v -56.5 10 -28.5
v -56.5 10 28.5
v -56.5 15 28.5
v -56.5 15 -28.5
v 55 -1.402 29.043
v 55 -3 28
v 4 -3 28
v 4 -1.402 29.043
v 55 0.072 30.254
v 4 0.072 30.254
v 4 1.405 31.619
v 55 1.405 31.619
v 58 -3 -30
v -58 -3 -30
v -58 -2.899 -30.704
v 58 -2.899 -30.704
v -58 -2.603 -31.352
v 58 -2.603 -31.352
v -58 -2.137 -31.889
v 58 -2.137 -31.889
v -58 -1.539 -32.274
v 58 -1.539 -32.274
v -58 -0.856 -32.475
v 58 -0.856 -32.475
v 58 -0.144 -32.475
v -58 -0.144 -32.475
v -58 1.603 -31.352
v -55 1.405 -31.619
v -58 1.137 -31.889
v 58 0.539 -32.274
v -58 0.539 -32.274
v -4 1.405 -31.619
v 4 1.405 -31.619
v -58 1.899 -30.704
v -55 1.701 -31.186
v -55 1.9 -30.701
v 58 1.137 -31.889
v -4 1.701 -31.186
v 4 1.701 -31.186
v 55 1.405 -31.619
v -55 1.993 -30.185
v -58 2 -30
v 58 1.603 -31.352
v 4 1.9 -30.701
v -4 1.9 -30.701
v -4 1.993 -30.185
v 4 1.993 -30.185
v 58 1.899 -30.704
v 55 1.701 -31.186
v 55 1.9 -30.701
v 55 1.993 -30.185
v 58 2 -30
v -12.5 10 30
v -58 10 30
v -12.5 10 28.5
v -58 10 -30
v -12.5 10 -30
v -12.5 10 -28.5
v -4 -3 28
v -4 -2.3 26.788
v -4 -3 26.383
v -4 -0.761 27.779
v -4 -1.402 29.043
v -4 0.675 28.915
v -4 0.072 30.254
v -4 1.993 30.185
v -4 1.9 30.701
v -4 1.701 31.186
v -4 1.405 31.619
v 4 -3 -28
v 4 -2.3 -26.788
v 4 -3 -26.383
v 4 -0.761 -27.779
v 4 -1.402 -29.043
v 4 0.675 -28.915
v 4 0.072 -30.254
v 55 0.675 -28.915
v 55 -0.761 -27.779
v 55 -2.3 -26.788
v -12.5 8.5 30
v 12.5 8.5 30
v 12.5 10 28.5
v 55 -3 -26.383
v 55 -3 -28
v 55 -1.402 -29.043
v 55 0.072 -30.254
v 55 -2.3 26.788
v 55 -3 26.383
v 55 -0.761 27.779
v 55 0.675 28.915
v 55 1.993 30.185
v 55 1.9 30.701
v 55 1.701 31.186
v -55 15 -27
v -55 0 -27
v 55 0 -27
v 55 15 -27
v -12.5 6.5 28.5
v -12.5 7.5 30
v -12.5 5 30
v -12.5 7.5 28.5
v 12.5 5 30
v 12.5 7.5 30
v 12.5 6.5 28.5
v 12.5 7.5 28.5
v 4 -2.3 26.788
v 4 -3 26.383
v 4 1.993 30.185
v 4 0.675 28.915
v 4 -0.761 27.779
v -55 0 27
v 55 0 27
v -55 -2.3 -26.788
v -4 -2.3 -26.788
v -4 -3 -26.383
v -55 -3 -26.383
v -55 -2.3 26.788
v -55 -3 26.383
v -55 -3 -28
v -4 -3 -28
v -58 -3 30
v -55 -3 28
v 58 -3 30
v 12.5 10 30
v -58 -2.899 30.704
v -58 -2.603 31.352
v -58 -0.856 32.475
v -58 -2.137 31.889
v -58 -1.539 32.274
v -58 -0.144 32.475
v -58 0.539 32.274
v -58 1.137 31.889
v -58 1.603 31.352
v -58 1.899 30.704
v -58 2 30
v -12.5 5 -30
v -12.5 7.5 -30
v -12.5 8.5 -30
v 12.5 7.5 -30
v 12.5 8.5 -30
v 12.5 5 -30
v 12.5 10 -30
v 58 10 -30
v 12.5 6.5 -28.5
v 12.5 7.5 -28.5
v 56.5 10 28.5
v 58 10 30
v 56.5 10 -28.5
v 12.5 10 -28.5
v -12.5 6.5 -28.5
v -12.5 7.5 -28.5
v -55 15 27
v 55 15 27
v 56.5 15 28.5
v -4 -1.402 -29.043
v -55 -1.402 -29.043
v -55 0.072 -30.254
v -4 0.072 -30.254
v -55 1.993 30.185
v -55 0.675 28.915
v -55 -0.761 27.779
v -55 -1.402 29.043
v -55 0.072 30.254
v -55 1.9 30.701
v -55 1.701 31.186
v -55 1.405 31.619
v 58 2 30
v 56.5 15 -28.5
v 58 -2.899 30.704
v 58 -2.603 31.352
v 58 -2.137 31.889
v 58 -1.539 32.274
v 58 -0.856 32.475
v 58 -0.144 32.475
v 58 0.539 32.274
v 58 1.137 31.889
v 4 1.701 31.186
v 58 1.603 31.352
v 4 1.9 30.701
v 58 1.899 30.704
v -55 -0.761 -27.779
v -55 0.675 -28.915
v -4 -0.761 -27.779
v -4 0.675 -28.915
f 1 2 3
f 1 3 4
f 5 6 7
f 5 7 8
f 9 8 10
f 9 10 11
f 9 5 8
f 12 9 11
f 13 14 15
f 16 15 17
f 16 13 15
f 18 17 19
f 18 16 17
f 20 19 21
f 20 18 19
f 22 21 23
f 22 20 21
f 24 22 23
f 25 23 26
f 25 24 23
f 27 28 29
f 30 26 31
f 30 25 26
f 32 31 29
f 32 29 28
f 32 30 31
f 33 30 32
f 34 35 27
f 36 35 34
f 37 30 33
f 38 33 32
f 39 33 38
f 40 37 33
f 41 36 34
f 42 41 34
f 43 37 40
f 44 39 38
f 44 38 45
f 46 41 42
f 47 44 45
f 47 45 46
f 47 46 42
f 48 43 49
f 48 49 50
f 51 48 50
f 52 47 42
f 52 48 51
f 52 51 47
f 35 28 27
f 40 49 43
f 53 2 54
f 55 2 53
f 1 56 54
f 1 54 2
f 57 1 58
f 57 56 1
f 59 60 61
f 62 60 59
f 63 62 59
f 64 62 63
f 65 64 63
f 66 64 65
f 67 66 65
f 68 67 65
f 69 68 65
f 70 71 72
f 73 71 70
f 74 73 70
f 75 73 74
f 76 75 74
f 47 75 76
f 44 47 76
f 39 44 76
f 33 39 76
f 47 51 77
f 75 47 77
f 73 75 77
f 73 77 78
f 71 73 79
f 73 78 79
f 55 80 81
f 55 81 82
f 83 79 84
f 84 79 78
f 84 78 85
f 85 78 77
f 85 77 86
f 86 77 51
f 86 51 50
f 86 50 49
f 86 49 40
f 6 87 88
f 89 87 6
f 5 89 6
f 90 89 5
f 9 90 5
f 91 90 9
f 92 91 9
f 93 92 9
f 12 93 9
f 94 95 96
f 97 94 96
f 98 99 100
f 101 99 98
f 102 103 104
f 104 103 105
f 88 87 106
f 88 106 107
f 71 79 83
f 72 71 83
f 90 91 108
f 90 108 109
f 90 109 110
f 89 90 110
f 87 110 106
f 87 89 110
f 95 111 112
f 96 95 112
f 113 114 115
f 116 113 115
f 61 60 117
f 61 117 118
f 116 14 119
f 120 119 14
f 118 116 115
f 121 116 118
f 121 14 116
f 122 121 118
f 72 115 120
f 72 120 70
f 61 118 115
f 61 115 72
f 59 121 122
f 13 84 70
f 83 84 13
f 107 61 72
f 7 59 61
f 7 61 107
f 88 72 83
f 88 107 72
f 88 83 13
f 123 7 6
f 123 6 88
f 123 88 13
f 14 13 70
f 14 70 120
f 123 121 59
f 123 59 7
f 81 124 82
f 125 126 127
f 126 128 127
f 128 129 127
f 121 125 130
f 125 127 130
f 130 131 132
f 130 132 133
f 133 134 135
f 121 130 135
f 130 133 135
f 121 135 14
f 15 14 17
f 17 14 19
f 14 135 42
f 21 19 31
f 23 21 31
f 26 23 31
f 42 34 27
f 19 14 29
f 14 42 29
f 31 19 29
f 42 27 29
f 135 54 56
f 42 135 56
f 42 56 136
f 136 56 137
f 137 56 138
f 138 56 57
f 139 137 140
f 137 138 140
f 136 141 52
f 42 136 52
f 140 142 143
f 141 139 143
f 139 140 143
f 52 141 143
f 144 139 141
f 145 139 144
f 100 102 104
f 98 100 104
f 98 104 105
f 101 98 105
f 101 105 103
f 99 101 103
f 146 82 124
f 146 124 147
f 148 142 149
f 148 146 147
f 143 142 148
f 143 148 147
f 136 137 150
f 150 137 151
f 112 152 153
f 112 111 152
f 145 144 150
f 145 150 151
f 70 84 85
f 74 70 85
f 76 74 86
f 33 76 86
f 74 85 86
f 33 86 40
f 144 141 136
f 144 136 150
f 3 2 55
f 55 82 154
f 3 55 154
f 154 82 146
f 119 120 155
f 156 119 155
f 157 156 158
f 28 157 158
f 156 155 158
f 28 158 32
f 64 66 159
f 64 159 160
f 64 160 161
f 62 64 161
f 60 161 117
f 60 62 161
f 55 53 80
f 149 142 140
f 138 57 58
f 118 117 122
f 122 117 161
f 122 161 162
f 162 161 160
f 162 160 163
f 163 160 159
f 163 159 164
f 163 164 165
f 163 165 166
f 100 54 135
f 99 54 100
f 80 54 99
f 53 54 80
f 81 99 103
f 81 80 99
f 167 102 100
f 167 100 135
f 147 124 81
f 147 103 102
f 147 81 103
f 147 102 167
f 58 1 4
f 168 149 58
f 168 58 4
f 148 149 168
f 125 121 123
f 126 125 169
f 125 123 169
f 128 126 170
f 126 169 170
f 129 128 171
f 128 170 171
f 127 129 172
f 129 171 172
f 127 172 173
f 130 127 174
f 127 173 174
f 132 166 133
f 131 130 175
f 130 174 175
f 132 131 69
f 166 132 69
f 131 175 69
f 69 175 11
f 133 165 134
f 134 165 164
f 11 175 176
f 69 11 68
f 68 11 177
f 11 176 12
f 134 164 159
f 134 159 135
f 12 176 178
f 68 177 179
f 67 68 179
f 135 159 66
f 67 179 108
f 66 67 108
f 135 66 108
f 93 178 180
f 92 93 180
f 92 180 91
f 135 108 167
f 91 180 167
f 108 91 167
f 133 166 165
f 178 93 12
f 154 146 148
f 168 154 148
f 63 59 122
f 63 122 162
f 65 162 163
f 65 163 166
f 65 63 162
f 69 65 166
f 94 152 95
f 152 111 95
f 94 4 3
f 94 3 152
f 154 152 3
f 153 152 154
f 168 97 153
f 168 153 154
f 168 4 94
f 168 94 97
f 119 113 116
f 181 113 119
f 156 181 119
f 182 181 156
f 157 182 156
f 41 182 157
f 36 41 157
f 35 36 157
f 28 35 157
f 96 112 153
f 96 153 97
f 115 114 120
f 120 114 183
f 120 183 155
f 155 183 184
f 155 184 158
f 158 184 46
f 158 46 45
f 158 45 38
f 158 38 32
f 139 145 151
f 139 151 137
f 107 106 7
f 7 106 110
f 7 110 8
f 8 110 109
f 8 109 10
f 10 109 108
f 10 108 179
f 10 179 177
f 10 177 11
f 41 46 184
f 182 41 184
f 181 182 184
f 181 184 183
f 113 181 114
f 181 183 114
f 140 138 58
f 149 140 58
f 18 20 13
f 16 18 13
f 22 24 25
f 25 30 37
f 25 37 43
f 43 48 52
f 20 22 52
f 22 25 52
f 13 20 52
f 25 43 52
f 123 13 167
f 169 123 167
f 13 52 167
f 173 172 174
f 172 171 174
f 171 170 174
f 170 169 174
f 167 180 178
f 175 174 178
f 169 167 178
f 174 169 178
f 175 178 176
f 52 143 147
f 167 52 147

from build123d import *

# Parameters (mm, degrees)
SKETCH1_W                       = 116
SKETCH1_H                       = 60
SKETCH1_W_2                     = 110
SKETCH1_H_2                     = 54
BOSS_EXTRUDE1_DEPTH             = 10
SKETCH2_W                       = 116
SKETCH2_H                       = 60
BOSS_EXTRUDE2_DEPTH             = 3
CUT_EXTRUDE1_DEPTH              = 12.5
BOSS_EXTRUDE4_REACH             = 68.061
BOSS_EXTRUDE4_DIRECTION_2_REACH = 68.061
BOSS_EXTRUDE5_DEPTH             = 55
CUT_EXTRUDE2_DEPTH              = 4
SKETCH7_W                       = 113
SKETCH7_H                       = 57
SKETCH7_W_2                     = 110
SKETCH7_H_2                     = 54
BOSS_EXTRUDE6_DEPTH             = 5


with BuildPart() as part:
    # Sketch1 → Boss-Extrude1 (new body)
    with BuildSketch(Plane(origin=(0, 0, 0), x_dir=(1, 0, 0), z_dir=(0, 1, 0))):
        Rectangle(SKETCH1_W, SKETCH1_H)
        Rectangle(SKETCH1_W_2, SKETCH1_H_2, mode=Mode.SUBTRACT)
    extrude(amount=BOSS_EXTRUDE1_DEPTH)

    # Sketch2 → Boss-Extrude2 (add)
    with BuildSketch(Plane.XZ):
        Rectangle(SKETCH2_W, SKETCH2_H)
    extrude(amount=BOSS_EXTRUDE2_DEPTH)

    # Sketch3 → Cut-Extrude1 (cut, symmetric)
    with BuildSketch(Plane(origin=(0, 0, 0), x_dir=(0, 0, -1), z_dir=(1, 0, 0))):
        Polygon((-28.5, 10), (-31, 10), (-31, 4), (-28.5, 6.5), (-28.5, 7.5), (-30, 7.5), (-30, 8.5), align=None)
    cut_extrude1 = extrude(amount=CUT_EXTRUDE1_DEPTH, both=True, mode=Mode.SUBTRACT)

    # Mirror1: Cut-Extrude1 across plane
    add(cut_extrude1.mirror(Plane.XY), mode=Mode.SUBTRACT)

    # Boss-Extrude4: up to this face of the body (flat: up to its plane)
    boss_extrude4_end = Plane(part.part.faces().sort_by_distance((58, 3.5, 0))[0])
    # Sketch4 → Boss-Extrude4 (add, up to the picked face)
    with BuildSketch(Plane(origin=(0, 0, 0), x_dir=(0, 0, -1), z_dir=(1, 0, 0)), mode=Mode.PRIVATE) as boss_extrude4_sk1:
        with BuildLine():
            Line((30, 2), (30, -3))
            ThreePointArc((30, -3), (32.5, -0.5), (30, 2))
        make_face()
    boss_extrude4_tool1 = split(extrude(boss_extrude4_sk1.sketch, amount=BOSS_EXTRUDE4_REACH, mode=Mode.PRIVATE), bisect_by=boss_extrude4_end, keep=Keep.BOTH, mode=Mode.PRIVATE)
    boss_extrude4 = boss_extrude4_tool1.solids().sort_by(Axis((0, -0.5, -31.061033), (1, 0, 0)))[0]
    add(boss_extrude4)

    # Boss-Extrude4 direction 2: up to this face of the body (flat: up to its plane)
    boss_extrude4_direction_2_end = Plane(part.part.faces().sort_by_distance((-58, 3.5, 0))[0])
    # Sketch4 → Boss-Extrude4 direction 2 (add, up to the picked face)
    with BuildSketch(Plane(origin=(0, 0, 0), x_dir=(0, 0, -1), z_dir=(1, 0, 0)), mode=Mode.PRIVATE) as boss_extrude4_direction_2_sk1:
        with BuildLine():
            Line((30, 2), (30, -3))
            ThreePointArc((30, -3), (32.5, -0.5), (30, 2))
        make_face()
    boss_extrude4_direction_2_tool1 = split(extrude(boss_extrude4_direction_2_sk1.sketch, amount=-BOSS_EXTRUDE4_DIRECTION_2_REACH, mode=Mode.PRIVATE), bisect_by=boss_extrude4_direction_2_end, keep=Keep.BOTH, mode=Mode.PRIVATE)
    boss_extrude4_direction_2 = boss_extrude4_direction_2_tool1.solids().sort_by(Axis((0, -0.5, -31.061033), (-1, 0, 0)))[0]
    add(boss_extrude4_direction_2)

    # Mirror3: Boss-Extrude4, Boss-Extrude4 direction 2 across plane
    add(boss_extrude4.mirror(Plane.XY))
    add(boss_extrude4_direction_2.mirror(Plane.XY))


with BuildPart() as body_2:
    # Sketch5 → Boss-Extrude5 (new, symmetric)
    with BuildSketch(Plane(origin=(0, 0, 0), x_dir=(0, 0, -1), z_dir=(1, 0, 0))):
        with BuildLine():
            Line((26.787564435, -2.3), (26.383419246, -3))
            Line((26.383419246, -3), (28, -3))
            ThreePointArc((28, -3), (29.996934481, -0.214678652), (32.5, 2.126352177))
            Line((32.5, 2.126352177), (32.5, 3.852866185))
            ThreePointArc((32.5, 3.852866185), (29.29668765, 1.098682153), (26.787564435, -2.3))
        make_face()
    extrude(amount=BOSS_EXTRUDE5_DEPTH, both=True)

    # Sketch6 → Cut-Extrude2 (cut, symmetric)
    with BuildSketch(Plane(origin=(0, 0, 0), x_dir=(0, 0, -1), z_dir=(1, 0, 0))):
        with BuildLine():
            Line((26.383419246, -3), (28, -3))
            ThreePointArc((28, -3), (29.996934481, -0.214678652), (32.5, 2.126352177))
            Line((32.5, 2.126352177), (32.5, 3.852866185))
            ThreePointArc((32.5, 3.852866185), (29.29668765, 1.098682153), (26.787564435, -2.3))
            Line((26.787564435, -2.3), (26.383419246, -3))
        make_face()
    extrude(amount=CUT_EXTRUDE2_DEPTH, both=True, mode=Mode.SUBTRACT)


with BuildPart() as cut_extrude2_piece_1:
    # of the separate pieces the step leaves, piece 1, a body of its own (cut_extrude2_pieces)
    add(body_2.part.solids().sort_by_distance((-4, -2.3, -26.787564435))[0])


with BuildPart() as cut_extrude2_piece_2:
    # of the separate pieces the step leaves, piece 2, a body of its own (cut_extrude2_pieces)
    add(body_2.part.solids().sort_by_distance((55, -2.3, -26.787564435))[0])


with BuildPart() as body_4:
    # Mirror2: mirrored copy
    add(cut_extrude2_piece_1.part.mirror(Plane.XY))


with BuildPart() as body_5:
    # Mirror2 2: mirrored copy
    add(cut_extrude2_piece_2.part.mirror(Plane.XY))


with BuildPart() as part_1:
    add(part.part)

    # Combine2: cut Cut-Extrude2 piece 1, Cut-Extrude2 piece 2, body 5, body 4
    add(cut_extrude2_piece_1.part, mode=Mode.SUBTRACT)
    add(cut_extrude2_piece_2.part, mode=Mode.SUBTRACT)
    add(body_5.part, mode=Mode.SUBTRACT)
    add(body_4.part, mode=Mode.SUBTRACT)

    # Sketch7 → Boss-Extrude6 (add)
    with BuildSketch(Plane(origin=(0, 10, 0), x_dir=(1, 0, 0), z_dir=(0, 1, 0))):
        Rectangle(SKETCH7_W, SKETCH7_H)
        Rectangle(SKETCH7_W_2, SKETCH7_H_2, mode=Mode.SUBTRACT)
    extrude(amount=BOSS_EXTRUDE6_DEPTH)


solid = part_1.part
